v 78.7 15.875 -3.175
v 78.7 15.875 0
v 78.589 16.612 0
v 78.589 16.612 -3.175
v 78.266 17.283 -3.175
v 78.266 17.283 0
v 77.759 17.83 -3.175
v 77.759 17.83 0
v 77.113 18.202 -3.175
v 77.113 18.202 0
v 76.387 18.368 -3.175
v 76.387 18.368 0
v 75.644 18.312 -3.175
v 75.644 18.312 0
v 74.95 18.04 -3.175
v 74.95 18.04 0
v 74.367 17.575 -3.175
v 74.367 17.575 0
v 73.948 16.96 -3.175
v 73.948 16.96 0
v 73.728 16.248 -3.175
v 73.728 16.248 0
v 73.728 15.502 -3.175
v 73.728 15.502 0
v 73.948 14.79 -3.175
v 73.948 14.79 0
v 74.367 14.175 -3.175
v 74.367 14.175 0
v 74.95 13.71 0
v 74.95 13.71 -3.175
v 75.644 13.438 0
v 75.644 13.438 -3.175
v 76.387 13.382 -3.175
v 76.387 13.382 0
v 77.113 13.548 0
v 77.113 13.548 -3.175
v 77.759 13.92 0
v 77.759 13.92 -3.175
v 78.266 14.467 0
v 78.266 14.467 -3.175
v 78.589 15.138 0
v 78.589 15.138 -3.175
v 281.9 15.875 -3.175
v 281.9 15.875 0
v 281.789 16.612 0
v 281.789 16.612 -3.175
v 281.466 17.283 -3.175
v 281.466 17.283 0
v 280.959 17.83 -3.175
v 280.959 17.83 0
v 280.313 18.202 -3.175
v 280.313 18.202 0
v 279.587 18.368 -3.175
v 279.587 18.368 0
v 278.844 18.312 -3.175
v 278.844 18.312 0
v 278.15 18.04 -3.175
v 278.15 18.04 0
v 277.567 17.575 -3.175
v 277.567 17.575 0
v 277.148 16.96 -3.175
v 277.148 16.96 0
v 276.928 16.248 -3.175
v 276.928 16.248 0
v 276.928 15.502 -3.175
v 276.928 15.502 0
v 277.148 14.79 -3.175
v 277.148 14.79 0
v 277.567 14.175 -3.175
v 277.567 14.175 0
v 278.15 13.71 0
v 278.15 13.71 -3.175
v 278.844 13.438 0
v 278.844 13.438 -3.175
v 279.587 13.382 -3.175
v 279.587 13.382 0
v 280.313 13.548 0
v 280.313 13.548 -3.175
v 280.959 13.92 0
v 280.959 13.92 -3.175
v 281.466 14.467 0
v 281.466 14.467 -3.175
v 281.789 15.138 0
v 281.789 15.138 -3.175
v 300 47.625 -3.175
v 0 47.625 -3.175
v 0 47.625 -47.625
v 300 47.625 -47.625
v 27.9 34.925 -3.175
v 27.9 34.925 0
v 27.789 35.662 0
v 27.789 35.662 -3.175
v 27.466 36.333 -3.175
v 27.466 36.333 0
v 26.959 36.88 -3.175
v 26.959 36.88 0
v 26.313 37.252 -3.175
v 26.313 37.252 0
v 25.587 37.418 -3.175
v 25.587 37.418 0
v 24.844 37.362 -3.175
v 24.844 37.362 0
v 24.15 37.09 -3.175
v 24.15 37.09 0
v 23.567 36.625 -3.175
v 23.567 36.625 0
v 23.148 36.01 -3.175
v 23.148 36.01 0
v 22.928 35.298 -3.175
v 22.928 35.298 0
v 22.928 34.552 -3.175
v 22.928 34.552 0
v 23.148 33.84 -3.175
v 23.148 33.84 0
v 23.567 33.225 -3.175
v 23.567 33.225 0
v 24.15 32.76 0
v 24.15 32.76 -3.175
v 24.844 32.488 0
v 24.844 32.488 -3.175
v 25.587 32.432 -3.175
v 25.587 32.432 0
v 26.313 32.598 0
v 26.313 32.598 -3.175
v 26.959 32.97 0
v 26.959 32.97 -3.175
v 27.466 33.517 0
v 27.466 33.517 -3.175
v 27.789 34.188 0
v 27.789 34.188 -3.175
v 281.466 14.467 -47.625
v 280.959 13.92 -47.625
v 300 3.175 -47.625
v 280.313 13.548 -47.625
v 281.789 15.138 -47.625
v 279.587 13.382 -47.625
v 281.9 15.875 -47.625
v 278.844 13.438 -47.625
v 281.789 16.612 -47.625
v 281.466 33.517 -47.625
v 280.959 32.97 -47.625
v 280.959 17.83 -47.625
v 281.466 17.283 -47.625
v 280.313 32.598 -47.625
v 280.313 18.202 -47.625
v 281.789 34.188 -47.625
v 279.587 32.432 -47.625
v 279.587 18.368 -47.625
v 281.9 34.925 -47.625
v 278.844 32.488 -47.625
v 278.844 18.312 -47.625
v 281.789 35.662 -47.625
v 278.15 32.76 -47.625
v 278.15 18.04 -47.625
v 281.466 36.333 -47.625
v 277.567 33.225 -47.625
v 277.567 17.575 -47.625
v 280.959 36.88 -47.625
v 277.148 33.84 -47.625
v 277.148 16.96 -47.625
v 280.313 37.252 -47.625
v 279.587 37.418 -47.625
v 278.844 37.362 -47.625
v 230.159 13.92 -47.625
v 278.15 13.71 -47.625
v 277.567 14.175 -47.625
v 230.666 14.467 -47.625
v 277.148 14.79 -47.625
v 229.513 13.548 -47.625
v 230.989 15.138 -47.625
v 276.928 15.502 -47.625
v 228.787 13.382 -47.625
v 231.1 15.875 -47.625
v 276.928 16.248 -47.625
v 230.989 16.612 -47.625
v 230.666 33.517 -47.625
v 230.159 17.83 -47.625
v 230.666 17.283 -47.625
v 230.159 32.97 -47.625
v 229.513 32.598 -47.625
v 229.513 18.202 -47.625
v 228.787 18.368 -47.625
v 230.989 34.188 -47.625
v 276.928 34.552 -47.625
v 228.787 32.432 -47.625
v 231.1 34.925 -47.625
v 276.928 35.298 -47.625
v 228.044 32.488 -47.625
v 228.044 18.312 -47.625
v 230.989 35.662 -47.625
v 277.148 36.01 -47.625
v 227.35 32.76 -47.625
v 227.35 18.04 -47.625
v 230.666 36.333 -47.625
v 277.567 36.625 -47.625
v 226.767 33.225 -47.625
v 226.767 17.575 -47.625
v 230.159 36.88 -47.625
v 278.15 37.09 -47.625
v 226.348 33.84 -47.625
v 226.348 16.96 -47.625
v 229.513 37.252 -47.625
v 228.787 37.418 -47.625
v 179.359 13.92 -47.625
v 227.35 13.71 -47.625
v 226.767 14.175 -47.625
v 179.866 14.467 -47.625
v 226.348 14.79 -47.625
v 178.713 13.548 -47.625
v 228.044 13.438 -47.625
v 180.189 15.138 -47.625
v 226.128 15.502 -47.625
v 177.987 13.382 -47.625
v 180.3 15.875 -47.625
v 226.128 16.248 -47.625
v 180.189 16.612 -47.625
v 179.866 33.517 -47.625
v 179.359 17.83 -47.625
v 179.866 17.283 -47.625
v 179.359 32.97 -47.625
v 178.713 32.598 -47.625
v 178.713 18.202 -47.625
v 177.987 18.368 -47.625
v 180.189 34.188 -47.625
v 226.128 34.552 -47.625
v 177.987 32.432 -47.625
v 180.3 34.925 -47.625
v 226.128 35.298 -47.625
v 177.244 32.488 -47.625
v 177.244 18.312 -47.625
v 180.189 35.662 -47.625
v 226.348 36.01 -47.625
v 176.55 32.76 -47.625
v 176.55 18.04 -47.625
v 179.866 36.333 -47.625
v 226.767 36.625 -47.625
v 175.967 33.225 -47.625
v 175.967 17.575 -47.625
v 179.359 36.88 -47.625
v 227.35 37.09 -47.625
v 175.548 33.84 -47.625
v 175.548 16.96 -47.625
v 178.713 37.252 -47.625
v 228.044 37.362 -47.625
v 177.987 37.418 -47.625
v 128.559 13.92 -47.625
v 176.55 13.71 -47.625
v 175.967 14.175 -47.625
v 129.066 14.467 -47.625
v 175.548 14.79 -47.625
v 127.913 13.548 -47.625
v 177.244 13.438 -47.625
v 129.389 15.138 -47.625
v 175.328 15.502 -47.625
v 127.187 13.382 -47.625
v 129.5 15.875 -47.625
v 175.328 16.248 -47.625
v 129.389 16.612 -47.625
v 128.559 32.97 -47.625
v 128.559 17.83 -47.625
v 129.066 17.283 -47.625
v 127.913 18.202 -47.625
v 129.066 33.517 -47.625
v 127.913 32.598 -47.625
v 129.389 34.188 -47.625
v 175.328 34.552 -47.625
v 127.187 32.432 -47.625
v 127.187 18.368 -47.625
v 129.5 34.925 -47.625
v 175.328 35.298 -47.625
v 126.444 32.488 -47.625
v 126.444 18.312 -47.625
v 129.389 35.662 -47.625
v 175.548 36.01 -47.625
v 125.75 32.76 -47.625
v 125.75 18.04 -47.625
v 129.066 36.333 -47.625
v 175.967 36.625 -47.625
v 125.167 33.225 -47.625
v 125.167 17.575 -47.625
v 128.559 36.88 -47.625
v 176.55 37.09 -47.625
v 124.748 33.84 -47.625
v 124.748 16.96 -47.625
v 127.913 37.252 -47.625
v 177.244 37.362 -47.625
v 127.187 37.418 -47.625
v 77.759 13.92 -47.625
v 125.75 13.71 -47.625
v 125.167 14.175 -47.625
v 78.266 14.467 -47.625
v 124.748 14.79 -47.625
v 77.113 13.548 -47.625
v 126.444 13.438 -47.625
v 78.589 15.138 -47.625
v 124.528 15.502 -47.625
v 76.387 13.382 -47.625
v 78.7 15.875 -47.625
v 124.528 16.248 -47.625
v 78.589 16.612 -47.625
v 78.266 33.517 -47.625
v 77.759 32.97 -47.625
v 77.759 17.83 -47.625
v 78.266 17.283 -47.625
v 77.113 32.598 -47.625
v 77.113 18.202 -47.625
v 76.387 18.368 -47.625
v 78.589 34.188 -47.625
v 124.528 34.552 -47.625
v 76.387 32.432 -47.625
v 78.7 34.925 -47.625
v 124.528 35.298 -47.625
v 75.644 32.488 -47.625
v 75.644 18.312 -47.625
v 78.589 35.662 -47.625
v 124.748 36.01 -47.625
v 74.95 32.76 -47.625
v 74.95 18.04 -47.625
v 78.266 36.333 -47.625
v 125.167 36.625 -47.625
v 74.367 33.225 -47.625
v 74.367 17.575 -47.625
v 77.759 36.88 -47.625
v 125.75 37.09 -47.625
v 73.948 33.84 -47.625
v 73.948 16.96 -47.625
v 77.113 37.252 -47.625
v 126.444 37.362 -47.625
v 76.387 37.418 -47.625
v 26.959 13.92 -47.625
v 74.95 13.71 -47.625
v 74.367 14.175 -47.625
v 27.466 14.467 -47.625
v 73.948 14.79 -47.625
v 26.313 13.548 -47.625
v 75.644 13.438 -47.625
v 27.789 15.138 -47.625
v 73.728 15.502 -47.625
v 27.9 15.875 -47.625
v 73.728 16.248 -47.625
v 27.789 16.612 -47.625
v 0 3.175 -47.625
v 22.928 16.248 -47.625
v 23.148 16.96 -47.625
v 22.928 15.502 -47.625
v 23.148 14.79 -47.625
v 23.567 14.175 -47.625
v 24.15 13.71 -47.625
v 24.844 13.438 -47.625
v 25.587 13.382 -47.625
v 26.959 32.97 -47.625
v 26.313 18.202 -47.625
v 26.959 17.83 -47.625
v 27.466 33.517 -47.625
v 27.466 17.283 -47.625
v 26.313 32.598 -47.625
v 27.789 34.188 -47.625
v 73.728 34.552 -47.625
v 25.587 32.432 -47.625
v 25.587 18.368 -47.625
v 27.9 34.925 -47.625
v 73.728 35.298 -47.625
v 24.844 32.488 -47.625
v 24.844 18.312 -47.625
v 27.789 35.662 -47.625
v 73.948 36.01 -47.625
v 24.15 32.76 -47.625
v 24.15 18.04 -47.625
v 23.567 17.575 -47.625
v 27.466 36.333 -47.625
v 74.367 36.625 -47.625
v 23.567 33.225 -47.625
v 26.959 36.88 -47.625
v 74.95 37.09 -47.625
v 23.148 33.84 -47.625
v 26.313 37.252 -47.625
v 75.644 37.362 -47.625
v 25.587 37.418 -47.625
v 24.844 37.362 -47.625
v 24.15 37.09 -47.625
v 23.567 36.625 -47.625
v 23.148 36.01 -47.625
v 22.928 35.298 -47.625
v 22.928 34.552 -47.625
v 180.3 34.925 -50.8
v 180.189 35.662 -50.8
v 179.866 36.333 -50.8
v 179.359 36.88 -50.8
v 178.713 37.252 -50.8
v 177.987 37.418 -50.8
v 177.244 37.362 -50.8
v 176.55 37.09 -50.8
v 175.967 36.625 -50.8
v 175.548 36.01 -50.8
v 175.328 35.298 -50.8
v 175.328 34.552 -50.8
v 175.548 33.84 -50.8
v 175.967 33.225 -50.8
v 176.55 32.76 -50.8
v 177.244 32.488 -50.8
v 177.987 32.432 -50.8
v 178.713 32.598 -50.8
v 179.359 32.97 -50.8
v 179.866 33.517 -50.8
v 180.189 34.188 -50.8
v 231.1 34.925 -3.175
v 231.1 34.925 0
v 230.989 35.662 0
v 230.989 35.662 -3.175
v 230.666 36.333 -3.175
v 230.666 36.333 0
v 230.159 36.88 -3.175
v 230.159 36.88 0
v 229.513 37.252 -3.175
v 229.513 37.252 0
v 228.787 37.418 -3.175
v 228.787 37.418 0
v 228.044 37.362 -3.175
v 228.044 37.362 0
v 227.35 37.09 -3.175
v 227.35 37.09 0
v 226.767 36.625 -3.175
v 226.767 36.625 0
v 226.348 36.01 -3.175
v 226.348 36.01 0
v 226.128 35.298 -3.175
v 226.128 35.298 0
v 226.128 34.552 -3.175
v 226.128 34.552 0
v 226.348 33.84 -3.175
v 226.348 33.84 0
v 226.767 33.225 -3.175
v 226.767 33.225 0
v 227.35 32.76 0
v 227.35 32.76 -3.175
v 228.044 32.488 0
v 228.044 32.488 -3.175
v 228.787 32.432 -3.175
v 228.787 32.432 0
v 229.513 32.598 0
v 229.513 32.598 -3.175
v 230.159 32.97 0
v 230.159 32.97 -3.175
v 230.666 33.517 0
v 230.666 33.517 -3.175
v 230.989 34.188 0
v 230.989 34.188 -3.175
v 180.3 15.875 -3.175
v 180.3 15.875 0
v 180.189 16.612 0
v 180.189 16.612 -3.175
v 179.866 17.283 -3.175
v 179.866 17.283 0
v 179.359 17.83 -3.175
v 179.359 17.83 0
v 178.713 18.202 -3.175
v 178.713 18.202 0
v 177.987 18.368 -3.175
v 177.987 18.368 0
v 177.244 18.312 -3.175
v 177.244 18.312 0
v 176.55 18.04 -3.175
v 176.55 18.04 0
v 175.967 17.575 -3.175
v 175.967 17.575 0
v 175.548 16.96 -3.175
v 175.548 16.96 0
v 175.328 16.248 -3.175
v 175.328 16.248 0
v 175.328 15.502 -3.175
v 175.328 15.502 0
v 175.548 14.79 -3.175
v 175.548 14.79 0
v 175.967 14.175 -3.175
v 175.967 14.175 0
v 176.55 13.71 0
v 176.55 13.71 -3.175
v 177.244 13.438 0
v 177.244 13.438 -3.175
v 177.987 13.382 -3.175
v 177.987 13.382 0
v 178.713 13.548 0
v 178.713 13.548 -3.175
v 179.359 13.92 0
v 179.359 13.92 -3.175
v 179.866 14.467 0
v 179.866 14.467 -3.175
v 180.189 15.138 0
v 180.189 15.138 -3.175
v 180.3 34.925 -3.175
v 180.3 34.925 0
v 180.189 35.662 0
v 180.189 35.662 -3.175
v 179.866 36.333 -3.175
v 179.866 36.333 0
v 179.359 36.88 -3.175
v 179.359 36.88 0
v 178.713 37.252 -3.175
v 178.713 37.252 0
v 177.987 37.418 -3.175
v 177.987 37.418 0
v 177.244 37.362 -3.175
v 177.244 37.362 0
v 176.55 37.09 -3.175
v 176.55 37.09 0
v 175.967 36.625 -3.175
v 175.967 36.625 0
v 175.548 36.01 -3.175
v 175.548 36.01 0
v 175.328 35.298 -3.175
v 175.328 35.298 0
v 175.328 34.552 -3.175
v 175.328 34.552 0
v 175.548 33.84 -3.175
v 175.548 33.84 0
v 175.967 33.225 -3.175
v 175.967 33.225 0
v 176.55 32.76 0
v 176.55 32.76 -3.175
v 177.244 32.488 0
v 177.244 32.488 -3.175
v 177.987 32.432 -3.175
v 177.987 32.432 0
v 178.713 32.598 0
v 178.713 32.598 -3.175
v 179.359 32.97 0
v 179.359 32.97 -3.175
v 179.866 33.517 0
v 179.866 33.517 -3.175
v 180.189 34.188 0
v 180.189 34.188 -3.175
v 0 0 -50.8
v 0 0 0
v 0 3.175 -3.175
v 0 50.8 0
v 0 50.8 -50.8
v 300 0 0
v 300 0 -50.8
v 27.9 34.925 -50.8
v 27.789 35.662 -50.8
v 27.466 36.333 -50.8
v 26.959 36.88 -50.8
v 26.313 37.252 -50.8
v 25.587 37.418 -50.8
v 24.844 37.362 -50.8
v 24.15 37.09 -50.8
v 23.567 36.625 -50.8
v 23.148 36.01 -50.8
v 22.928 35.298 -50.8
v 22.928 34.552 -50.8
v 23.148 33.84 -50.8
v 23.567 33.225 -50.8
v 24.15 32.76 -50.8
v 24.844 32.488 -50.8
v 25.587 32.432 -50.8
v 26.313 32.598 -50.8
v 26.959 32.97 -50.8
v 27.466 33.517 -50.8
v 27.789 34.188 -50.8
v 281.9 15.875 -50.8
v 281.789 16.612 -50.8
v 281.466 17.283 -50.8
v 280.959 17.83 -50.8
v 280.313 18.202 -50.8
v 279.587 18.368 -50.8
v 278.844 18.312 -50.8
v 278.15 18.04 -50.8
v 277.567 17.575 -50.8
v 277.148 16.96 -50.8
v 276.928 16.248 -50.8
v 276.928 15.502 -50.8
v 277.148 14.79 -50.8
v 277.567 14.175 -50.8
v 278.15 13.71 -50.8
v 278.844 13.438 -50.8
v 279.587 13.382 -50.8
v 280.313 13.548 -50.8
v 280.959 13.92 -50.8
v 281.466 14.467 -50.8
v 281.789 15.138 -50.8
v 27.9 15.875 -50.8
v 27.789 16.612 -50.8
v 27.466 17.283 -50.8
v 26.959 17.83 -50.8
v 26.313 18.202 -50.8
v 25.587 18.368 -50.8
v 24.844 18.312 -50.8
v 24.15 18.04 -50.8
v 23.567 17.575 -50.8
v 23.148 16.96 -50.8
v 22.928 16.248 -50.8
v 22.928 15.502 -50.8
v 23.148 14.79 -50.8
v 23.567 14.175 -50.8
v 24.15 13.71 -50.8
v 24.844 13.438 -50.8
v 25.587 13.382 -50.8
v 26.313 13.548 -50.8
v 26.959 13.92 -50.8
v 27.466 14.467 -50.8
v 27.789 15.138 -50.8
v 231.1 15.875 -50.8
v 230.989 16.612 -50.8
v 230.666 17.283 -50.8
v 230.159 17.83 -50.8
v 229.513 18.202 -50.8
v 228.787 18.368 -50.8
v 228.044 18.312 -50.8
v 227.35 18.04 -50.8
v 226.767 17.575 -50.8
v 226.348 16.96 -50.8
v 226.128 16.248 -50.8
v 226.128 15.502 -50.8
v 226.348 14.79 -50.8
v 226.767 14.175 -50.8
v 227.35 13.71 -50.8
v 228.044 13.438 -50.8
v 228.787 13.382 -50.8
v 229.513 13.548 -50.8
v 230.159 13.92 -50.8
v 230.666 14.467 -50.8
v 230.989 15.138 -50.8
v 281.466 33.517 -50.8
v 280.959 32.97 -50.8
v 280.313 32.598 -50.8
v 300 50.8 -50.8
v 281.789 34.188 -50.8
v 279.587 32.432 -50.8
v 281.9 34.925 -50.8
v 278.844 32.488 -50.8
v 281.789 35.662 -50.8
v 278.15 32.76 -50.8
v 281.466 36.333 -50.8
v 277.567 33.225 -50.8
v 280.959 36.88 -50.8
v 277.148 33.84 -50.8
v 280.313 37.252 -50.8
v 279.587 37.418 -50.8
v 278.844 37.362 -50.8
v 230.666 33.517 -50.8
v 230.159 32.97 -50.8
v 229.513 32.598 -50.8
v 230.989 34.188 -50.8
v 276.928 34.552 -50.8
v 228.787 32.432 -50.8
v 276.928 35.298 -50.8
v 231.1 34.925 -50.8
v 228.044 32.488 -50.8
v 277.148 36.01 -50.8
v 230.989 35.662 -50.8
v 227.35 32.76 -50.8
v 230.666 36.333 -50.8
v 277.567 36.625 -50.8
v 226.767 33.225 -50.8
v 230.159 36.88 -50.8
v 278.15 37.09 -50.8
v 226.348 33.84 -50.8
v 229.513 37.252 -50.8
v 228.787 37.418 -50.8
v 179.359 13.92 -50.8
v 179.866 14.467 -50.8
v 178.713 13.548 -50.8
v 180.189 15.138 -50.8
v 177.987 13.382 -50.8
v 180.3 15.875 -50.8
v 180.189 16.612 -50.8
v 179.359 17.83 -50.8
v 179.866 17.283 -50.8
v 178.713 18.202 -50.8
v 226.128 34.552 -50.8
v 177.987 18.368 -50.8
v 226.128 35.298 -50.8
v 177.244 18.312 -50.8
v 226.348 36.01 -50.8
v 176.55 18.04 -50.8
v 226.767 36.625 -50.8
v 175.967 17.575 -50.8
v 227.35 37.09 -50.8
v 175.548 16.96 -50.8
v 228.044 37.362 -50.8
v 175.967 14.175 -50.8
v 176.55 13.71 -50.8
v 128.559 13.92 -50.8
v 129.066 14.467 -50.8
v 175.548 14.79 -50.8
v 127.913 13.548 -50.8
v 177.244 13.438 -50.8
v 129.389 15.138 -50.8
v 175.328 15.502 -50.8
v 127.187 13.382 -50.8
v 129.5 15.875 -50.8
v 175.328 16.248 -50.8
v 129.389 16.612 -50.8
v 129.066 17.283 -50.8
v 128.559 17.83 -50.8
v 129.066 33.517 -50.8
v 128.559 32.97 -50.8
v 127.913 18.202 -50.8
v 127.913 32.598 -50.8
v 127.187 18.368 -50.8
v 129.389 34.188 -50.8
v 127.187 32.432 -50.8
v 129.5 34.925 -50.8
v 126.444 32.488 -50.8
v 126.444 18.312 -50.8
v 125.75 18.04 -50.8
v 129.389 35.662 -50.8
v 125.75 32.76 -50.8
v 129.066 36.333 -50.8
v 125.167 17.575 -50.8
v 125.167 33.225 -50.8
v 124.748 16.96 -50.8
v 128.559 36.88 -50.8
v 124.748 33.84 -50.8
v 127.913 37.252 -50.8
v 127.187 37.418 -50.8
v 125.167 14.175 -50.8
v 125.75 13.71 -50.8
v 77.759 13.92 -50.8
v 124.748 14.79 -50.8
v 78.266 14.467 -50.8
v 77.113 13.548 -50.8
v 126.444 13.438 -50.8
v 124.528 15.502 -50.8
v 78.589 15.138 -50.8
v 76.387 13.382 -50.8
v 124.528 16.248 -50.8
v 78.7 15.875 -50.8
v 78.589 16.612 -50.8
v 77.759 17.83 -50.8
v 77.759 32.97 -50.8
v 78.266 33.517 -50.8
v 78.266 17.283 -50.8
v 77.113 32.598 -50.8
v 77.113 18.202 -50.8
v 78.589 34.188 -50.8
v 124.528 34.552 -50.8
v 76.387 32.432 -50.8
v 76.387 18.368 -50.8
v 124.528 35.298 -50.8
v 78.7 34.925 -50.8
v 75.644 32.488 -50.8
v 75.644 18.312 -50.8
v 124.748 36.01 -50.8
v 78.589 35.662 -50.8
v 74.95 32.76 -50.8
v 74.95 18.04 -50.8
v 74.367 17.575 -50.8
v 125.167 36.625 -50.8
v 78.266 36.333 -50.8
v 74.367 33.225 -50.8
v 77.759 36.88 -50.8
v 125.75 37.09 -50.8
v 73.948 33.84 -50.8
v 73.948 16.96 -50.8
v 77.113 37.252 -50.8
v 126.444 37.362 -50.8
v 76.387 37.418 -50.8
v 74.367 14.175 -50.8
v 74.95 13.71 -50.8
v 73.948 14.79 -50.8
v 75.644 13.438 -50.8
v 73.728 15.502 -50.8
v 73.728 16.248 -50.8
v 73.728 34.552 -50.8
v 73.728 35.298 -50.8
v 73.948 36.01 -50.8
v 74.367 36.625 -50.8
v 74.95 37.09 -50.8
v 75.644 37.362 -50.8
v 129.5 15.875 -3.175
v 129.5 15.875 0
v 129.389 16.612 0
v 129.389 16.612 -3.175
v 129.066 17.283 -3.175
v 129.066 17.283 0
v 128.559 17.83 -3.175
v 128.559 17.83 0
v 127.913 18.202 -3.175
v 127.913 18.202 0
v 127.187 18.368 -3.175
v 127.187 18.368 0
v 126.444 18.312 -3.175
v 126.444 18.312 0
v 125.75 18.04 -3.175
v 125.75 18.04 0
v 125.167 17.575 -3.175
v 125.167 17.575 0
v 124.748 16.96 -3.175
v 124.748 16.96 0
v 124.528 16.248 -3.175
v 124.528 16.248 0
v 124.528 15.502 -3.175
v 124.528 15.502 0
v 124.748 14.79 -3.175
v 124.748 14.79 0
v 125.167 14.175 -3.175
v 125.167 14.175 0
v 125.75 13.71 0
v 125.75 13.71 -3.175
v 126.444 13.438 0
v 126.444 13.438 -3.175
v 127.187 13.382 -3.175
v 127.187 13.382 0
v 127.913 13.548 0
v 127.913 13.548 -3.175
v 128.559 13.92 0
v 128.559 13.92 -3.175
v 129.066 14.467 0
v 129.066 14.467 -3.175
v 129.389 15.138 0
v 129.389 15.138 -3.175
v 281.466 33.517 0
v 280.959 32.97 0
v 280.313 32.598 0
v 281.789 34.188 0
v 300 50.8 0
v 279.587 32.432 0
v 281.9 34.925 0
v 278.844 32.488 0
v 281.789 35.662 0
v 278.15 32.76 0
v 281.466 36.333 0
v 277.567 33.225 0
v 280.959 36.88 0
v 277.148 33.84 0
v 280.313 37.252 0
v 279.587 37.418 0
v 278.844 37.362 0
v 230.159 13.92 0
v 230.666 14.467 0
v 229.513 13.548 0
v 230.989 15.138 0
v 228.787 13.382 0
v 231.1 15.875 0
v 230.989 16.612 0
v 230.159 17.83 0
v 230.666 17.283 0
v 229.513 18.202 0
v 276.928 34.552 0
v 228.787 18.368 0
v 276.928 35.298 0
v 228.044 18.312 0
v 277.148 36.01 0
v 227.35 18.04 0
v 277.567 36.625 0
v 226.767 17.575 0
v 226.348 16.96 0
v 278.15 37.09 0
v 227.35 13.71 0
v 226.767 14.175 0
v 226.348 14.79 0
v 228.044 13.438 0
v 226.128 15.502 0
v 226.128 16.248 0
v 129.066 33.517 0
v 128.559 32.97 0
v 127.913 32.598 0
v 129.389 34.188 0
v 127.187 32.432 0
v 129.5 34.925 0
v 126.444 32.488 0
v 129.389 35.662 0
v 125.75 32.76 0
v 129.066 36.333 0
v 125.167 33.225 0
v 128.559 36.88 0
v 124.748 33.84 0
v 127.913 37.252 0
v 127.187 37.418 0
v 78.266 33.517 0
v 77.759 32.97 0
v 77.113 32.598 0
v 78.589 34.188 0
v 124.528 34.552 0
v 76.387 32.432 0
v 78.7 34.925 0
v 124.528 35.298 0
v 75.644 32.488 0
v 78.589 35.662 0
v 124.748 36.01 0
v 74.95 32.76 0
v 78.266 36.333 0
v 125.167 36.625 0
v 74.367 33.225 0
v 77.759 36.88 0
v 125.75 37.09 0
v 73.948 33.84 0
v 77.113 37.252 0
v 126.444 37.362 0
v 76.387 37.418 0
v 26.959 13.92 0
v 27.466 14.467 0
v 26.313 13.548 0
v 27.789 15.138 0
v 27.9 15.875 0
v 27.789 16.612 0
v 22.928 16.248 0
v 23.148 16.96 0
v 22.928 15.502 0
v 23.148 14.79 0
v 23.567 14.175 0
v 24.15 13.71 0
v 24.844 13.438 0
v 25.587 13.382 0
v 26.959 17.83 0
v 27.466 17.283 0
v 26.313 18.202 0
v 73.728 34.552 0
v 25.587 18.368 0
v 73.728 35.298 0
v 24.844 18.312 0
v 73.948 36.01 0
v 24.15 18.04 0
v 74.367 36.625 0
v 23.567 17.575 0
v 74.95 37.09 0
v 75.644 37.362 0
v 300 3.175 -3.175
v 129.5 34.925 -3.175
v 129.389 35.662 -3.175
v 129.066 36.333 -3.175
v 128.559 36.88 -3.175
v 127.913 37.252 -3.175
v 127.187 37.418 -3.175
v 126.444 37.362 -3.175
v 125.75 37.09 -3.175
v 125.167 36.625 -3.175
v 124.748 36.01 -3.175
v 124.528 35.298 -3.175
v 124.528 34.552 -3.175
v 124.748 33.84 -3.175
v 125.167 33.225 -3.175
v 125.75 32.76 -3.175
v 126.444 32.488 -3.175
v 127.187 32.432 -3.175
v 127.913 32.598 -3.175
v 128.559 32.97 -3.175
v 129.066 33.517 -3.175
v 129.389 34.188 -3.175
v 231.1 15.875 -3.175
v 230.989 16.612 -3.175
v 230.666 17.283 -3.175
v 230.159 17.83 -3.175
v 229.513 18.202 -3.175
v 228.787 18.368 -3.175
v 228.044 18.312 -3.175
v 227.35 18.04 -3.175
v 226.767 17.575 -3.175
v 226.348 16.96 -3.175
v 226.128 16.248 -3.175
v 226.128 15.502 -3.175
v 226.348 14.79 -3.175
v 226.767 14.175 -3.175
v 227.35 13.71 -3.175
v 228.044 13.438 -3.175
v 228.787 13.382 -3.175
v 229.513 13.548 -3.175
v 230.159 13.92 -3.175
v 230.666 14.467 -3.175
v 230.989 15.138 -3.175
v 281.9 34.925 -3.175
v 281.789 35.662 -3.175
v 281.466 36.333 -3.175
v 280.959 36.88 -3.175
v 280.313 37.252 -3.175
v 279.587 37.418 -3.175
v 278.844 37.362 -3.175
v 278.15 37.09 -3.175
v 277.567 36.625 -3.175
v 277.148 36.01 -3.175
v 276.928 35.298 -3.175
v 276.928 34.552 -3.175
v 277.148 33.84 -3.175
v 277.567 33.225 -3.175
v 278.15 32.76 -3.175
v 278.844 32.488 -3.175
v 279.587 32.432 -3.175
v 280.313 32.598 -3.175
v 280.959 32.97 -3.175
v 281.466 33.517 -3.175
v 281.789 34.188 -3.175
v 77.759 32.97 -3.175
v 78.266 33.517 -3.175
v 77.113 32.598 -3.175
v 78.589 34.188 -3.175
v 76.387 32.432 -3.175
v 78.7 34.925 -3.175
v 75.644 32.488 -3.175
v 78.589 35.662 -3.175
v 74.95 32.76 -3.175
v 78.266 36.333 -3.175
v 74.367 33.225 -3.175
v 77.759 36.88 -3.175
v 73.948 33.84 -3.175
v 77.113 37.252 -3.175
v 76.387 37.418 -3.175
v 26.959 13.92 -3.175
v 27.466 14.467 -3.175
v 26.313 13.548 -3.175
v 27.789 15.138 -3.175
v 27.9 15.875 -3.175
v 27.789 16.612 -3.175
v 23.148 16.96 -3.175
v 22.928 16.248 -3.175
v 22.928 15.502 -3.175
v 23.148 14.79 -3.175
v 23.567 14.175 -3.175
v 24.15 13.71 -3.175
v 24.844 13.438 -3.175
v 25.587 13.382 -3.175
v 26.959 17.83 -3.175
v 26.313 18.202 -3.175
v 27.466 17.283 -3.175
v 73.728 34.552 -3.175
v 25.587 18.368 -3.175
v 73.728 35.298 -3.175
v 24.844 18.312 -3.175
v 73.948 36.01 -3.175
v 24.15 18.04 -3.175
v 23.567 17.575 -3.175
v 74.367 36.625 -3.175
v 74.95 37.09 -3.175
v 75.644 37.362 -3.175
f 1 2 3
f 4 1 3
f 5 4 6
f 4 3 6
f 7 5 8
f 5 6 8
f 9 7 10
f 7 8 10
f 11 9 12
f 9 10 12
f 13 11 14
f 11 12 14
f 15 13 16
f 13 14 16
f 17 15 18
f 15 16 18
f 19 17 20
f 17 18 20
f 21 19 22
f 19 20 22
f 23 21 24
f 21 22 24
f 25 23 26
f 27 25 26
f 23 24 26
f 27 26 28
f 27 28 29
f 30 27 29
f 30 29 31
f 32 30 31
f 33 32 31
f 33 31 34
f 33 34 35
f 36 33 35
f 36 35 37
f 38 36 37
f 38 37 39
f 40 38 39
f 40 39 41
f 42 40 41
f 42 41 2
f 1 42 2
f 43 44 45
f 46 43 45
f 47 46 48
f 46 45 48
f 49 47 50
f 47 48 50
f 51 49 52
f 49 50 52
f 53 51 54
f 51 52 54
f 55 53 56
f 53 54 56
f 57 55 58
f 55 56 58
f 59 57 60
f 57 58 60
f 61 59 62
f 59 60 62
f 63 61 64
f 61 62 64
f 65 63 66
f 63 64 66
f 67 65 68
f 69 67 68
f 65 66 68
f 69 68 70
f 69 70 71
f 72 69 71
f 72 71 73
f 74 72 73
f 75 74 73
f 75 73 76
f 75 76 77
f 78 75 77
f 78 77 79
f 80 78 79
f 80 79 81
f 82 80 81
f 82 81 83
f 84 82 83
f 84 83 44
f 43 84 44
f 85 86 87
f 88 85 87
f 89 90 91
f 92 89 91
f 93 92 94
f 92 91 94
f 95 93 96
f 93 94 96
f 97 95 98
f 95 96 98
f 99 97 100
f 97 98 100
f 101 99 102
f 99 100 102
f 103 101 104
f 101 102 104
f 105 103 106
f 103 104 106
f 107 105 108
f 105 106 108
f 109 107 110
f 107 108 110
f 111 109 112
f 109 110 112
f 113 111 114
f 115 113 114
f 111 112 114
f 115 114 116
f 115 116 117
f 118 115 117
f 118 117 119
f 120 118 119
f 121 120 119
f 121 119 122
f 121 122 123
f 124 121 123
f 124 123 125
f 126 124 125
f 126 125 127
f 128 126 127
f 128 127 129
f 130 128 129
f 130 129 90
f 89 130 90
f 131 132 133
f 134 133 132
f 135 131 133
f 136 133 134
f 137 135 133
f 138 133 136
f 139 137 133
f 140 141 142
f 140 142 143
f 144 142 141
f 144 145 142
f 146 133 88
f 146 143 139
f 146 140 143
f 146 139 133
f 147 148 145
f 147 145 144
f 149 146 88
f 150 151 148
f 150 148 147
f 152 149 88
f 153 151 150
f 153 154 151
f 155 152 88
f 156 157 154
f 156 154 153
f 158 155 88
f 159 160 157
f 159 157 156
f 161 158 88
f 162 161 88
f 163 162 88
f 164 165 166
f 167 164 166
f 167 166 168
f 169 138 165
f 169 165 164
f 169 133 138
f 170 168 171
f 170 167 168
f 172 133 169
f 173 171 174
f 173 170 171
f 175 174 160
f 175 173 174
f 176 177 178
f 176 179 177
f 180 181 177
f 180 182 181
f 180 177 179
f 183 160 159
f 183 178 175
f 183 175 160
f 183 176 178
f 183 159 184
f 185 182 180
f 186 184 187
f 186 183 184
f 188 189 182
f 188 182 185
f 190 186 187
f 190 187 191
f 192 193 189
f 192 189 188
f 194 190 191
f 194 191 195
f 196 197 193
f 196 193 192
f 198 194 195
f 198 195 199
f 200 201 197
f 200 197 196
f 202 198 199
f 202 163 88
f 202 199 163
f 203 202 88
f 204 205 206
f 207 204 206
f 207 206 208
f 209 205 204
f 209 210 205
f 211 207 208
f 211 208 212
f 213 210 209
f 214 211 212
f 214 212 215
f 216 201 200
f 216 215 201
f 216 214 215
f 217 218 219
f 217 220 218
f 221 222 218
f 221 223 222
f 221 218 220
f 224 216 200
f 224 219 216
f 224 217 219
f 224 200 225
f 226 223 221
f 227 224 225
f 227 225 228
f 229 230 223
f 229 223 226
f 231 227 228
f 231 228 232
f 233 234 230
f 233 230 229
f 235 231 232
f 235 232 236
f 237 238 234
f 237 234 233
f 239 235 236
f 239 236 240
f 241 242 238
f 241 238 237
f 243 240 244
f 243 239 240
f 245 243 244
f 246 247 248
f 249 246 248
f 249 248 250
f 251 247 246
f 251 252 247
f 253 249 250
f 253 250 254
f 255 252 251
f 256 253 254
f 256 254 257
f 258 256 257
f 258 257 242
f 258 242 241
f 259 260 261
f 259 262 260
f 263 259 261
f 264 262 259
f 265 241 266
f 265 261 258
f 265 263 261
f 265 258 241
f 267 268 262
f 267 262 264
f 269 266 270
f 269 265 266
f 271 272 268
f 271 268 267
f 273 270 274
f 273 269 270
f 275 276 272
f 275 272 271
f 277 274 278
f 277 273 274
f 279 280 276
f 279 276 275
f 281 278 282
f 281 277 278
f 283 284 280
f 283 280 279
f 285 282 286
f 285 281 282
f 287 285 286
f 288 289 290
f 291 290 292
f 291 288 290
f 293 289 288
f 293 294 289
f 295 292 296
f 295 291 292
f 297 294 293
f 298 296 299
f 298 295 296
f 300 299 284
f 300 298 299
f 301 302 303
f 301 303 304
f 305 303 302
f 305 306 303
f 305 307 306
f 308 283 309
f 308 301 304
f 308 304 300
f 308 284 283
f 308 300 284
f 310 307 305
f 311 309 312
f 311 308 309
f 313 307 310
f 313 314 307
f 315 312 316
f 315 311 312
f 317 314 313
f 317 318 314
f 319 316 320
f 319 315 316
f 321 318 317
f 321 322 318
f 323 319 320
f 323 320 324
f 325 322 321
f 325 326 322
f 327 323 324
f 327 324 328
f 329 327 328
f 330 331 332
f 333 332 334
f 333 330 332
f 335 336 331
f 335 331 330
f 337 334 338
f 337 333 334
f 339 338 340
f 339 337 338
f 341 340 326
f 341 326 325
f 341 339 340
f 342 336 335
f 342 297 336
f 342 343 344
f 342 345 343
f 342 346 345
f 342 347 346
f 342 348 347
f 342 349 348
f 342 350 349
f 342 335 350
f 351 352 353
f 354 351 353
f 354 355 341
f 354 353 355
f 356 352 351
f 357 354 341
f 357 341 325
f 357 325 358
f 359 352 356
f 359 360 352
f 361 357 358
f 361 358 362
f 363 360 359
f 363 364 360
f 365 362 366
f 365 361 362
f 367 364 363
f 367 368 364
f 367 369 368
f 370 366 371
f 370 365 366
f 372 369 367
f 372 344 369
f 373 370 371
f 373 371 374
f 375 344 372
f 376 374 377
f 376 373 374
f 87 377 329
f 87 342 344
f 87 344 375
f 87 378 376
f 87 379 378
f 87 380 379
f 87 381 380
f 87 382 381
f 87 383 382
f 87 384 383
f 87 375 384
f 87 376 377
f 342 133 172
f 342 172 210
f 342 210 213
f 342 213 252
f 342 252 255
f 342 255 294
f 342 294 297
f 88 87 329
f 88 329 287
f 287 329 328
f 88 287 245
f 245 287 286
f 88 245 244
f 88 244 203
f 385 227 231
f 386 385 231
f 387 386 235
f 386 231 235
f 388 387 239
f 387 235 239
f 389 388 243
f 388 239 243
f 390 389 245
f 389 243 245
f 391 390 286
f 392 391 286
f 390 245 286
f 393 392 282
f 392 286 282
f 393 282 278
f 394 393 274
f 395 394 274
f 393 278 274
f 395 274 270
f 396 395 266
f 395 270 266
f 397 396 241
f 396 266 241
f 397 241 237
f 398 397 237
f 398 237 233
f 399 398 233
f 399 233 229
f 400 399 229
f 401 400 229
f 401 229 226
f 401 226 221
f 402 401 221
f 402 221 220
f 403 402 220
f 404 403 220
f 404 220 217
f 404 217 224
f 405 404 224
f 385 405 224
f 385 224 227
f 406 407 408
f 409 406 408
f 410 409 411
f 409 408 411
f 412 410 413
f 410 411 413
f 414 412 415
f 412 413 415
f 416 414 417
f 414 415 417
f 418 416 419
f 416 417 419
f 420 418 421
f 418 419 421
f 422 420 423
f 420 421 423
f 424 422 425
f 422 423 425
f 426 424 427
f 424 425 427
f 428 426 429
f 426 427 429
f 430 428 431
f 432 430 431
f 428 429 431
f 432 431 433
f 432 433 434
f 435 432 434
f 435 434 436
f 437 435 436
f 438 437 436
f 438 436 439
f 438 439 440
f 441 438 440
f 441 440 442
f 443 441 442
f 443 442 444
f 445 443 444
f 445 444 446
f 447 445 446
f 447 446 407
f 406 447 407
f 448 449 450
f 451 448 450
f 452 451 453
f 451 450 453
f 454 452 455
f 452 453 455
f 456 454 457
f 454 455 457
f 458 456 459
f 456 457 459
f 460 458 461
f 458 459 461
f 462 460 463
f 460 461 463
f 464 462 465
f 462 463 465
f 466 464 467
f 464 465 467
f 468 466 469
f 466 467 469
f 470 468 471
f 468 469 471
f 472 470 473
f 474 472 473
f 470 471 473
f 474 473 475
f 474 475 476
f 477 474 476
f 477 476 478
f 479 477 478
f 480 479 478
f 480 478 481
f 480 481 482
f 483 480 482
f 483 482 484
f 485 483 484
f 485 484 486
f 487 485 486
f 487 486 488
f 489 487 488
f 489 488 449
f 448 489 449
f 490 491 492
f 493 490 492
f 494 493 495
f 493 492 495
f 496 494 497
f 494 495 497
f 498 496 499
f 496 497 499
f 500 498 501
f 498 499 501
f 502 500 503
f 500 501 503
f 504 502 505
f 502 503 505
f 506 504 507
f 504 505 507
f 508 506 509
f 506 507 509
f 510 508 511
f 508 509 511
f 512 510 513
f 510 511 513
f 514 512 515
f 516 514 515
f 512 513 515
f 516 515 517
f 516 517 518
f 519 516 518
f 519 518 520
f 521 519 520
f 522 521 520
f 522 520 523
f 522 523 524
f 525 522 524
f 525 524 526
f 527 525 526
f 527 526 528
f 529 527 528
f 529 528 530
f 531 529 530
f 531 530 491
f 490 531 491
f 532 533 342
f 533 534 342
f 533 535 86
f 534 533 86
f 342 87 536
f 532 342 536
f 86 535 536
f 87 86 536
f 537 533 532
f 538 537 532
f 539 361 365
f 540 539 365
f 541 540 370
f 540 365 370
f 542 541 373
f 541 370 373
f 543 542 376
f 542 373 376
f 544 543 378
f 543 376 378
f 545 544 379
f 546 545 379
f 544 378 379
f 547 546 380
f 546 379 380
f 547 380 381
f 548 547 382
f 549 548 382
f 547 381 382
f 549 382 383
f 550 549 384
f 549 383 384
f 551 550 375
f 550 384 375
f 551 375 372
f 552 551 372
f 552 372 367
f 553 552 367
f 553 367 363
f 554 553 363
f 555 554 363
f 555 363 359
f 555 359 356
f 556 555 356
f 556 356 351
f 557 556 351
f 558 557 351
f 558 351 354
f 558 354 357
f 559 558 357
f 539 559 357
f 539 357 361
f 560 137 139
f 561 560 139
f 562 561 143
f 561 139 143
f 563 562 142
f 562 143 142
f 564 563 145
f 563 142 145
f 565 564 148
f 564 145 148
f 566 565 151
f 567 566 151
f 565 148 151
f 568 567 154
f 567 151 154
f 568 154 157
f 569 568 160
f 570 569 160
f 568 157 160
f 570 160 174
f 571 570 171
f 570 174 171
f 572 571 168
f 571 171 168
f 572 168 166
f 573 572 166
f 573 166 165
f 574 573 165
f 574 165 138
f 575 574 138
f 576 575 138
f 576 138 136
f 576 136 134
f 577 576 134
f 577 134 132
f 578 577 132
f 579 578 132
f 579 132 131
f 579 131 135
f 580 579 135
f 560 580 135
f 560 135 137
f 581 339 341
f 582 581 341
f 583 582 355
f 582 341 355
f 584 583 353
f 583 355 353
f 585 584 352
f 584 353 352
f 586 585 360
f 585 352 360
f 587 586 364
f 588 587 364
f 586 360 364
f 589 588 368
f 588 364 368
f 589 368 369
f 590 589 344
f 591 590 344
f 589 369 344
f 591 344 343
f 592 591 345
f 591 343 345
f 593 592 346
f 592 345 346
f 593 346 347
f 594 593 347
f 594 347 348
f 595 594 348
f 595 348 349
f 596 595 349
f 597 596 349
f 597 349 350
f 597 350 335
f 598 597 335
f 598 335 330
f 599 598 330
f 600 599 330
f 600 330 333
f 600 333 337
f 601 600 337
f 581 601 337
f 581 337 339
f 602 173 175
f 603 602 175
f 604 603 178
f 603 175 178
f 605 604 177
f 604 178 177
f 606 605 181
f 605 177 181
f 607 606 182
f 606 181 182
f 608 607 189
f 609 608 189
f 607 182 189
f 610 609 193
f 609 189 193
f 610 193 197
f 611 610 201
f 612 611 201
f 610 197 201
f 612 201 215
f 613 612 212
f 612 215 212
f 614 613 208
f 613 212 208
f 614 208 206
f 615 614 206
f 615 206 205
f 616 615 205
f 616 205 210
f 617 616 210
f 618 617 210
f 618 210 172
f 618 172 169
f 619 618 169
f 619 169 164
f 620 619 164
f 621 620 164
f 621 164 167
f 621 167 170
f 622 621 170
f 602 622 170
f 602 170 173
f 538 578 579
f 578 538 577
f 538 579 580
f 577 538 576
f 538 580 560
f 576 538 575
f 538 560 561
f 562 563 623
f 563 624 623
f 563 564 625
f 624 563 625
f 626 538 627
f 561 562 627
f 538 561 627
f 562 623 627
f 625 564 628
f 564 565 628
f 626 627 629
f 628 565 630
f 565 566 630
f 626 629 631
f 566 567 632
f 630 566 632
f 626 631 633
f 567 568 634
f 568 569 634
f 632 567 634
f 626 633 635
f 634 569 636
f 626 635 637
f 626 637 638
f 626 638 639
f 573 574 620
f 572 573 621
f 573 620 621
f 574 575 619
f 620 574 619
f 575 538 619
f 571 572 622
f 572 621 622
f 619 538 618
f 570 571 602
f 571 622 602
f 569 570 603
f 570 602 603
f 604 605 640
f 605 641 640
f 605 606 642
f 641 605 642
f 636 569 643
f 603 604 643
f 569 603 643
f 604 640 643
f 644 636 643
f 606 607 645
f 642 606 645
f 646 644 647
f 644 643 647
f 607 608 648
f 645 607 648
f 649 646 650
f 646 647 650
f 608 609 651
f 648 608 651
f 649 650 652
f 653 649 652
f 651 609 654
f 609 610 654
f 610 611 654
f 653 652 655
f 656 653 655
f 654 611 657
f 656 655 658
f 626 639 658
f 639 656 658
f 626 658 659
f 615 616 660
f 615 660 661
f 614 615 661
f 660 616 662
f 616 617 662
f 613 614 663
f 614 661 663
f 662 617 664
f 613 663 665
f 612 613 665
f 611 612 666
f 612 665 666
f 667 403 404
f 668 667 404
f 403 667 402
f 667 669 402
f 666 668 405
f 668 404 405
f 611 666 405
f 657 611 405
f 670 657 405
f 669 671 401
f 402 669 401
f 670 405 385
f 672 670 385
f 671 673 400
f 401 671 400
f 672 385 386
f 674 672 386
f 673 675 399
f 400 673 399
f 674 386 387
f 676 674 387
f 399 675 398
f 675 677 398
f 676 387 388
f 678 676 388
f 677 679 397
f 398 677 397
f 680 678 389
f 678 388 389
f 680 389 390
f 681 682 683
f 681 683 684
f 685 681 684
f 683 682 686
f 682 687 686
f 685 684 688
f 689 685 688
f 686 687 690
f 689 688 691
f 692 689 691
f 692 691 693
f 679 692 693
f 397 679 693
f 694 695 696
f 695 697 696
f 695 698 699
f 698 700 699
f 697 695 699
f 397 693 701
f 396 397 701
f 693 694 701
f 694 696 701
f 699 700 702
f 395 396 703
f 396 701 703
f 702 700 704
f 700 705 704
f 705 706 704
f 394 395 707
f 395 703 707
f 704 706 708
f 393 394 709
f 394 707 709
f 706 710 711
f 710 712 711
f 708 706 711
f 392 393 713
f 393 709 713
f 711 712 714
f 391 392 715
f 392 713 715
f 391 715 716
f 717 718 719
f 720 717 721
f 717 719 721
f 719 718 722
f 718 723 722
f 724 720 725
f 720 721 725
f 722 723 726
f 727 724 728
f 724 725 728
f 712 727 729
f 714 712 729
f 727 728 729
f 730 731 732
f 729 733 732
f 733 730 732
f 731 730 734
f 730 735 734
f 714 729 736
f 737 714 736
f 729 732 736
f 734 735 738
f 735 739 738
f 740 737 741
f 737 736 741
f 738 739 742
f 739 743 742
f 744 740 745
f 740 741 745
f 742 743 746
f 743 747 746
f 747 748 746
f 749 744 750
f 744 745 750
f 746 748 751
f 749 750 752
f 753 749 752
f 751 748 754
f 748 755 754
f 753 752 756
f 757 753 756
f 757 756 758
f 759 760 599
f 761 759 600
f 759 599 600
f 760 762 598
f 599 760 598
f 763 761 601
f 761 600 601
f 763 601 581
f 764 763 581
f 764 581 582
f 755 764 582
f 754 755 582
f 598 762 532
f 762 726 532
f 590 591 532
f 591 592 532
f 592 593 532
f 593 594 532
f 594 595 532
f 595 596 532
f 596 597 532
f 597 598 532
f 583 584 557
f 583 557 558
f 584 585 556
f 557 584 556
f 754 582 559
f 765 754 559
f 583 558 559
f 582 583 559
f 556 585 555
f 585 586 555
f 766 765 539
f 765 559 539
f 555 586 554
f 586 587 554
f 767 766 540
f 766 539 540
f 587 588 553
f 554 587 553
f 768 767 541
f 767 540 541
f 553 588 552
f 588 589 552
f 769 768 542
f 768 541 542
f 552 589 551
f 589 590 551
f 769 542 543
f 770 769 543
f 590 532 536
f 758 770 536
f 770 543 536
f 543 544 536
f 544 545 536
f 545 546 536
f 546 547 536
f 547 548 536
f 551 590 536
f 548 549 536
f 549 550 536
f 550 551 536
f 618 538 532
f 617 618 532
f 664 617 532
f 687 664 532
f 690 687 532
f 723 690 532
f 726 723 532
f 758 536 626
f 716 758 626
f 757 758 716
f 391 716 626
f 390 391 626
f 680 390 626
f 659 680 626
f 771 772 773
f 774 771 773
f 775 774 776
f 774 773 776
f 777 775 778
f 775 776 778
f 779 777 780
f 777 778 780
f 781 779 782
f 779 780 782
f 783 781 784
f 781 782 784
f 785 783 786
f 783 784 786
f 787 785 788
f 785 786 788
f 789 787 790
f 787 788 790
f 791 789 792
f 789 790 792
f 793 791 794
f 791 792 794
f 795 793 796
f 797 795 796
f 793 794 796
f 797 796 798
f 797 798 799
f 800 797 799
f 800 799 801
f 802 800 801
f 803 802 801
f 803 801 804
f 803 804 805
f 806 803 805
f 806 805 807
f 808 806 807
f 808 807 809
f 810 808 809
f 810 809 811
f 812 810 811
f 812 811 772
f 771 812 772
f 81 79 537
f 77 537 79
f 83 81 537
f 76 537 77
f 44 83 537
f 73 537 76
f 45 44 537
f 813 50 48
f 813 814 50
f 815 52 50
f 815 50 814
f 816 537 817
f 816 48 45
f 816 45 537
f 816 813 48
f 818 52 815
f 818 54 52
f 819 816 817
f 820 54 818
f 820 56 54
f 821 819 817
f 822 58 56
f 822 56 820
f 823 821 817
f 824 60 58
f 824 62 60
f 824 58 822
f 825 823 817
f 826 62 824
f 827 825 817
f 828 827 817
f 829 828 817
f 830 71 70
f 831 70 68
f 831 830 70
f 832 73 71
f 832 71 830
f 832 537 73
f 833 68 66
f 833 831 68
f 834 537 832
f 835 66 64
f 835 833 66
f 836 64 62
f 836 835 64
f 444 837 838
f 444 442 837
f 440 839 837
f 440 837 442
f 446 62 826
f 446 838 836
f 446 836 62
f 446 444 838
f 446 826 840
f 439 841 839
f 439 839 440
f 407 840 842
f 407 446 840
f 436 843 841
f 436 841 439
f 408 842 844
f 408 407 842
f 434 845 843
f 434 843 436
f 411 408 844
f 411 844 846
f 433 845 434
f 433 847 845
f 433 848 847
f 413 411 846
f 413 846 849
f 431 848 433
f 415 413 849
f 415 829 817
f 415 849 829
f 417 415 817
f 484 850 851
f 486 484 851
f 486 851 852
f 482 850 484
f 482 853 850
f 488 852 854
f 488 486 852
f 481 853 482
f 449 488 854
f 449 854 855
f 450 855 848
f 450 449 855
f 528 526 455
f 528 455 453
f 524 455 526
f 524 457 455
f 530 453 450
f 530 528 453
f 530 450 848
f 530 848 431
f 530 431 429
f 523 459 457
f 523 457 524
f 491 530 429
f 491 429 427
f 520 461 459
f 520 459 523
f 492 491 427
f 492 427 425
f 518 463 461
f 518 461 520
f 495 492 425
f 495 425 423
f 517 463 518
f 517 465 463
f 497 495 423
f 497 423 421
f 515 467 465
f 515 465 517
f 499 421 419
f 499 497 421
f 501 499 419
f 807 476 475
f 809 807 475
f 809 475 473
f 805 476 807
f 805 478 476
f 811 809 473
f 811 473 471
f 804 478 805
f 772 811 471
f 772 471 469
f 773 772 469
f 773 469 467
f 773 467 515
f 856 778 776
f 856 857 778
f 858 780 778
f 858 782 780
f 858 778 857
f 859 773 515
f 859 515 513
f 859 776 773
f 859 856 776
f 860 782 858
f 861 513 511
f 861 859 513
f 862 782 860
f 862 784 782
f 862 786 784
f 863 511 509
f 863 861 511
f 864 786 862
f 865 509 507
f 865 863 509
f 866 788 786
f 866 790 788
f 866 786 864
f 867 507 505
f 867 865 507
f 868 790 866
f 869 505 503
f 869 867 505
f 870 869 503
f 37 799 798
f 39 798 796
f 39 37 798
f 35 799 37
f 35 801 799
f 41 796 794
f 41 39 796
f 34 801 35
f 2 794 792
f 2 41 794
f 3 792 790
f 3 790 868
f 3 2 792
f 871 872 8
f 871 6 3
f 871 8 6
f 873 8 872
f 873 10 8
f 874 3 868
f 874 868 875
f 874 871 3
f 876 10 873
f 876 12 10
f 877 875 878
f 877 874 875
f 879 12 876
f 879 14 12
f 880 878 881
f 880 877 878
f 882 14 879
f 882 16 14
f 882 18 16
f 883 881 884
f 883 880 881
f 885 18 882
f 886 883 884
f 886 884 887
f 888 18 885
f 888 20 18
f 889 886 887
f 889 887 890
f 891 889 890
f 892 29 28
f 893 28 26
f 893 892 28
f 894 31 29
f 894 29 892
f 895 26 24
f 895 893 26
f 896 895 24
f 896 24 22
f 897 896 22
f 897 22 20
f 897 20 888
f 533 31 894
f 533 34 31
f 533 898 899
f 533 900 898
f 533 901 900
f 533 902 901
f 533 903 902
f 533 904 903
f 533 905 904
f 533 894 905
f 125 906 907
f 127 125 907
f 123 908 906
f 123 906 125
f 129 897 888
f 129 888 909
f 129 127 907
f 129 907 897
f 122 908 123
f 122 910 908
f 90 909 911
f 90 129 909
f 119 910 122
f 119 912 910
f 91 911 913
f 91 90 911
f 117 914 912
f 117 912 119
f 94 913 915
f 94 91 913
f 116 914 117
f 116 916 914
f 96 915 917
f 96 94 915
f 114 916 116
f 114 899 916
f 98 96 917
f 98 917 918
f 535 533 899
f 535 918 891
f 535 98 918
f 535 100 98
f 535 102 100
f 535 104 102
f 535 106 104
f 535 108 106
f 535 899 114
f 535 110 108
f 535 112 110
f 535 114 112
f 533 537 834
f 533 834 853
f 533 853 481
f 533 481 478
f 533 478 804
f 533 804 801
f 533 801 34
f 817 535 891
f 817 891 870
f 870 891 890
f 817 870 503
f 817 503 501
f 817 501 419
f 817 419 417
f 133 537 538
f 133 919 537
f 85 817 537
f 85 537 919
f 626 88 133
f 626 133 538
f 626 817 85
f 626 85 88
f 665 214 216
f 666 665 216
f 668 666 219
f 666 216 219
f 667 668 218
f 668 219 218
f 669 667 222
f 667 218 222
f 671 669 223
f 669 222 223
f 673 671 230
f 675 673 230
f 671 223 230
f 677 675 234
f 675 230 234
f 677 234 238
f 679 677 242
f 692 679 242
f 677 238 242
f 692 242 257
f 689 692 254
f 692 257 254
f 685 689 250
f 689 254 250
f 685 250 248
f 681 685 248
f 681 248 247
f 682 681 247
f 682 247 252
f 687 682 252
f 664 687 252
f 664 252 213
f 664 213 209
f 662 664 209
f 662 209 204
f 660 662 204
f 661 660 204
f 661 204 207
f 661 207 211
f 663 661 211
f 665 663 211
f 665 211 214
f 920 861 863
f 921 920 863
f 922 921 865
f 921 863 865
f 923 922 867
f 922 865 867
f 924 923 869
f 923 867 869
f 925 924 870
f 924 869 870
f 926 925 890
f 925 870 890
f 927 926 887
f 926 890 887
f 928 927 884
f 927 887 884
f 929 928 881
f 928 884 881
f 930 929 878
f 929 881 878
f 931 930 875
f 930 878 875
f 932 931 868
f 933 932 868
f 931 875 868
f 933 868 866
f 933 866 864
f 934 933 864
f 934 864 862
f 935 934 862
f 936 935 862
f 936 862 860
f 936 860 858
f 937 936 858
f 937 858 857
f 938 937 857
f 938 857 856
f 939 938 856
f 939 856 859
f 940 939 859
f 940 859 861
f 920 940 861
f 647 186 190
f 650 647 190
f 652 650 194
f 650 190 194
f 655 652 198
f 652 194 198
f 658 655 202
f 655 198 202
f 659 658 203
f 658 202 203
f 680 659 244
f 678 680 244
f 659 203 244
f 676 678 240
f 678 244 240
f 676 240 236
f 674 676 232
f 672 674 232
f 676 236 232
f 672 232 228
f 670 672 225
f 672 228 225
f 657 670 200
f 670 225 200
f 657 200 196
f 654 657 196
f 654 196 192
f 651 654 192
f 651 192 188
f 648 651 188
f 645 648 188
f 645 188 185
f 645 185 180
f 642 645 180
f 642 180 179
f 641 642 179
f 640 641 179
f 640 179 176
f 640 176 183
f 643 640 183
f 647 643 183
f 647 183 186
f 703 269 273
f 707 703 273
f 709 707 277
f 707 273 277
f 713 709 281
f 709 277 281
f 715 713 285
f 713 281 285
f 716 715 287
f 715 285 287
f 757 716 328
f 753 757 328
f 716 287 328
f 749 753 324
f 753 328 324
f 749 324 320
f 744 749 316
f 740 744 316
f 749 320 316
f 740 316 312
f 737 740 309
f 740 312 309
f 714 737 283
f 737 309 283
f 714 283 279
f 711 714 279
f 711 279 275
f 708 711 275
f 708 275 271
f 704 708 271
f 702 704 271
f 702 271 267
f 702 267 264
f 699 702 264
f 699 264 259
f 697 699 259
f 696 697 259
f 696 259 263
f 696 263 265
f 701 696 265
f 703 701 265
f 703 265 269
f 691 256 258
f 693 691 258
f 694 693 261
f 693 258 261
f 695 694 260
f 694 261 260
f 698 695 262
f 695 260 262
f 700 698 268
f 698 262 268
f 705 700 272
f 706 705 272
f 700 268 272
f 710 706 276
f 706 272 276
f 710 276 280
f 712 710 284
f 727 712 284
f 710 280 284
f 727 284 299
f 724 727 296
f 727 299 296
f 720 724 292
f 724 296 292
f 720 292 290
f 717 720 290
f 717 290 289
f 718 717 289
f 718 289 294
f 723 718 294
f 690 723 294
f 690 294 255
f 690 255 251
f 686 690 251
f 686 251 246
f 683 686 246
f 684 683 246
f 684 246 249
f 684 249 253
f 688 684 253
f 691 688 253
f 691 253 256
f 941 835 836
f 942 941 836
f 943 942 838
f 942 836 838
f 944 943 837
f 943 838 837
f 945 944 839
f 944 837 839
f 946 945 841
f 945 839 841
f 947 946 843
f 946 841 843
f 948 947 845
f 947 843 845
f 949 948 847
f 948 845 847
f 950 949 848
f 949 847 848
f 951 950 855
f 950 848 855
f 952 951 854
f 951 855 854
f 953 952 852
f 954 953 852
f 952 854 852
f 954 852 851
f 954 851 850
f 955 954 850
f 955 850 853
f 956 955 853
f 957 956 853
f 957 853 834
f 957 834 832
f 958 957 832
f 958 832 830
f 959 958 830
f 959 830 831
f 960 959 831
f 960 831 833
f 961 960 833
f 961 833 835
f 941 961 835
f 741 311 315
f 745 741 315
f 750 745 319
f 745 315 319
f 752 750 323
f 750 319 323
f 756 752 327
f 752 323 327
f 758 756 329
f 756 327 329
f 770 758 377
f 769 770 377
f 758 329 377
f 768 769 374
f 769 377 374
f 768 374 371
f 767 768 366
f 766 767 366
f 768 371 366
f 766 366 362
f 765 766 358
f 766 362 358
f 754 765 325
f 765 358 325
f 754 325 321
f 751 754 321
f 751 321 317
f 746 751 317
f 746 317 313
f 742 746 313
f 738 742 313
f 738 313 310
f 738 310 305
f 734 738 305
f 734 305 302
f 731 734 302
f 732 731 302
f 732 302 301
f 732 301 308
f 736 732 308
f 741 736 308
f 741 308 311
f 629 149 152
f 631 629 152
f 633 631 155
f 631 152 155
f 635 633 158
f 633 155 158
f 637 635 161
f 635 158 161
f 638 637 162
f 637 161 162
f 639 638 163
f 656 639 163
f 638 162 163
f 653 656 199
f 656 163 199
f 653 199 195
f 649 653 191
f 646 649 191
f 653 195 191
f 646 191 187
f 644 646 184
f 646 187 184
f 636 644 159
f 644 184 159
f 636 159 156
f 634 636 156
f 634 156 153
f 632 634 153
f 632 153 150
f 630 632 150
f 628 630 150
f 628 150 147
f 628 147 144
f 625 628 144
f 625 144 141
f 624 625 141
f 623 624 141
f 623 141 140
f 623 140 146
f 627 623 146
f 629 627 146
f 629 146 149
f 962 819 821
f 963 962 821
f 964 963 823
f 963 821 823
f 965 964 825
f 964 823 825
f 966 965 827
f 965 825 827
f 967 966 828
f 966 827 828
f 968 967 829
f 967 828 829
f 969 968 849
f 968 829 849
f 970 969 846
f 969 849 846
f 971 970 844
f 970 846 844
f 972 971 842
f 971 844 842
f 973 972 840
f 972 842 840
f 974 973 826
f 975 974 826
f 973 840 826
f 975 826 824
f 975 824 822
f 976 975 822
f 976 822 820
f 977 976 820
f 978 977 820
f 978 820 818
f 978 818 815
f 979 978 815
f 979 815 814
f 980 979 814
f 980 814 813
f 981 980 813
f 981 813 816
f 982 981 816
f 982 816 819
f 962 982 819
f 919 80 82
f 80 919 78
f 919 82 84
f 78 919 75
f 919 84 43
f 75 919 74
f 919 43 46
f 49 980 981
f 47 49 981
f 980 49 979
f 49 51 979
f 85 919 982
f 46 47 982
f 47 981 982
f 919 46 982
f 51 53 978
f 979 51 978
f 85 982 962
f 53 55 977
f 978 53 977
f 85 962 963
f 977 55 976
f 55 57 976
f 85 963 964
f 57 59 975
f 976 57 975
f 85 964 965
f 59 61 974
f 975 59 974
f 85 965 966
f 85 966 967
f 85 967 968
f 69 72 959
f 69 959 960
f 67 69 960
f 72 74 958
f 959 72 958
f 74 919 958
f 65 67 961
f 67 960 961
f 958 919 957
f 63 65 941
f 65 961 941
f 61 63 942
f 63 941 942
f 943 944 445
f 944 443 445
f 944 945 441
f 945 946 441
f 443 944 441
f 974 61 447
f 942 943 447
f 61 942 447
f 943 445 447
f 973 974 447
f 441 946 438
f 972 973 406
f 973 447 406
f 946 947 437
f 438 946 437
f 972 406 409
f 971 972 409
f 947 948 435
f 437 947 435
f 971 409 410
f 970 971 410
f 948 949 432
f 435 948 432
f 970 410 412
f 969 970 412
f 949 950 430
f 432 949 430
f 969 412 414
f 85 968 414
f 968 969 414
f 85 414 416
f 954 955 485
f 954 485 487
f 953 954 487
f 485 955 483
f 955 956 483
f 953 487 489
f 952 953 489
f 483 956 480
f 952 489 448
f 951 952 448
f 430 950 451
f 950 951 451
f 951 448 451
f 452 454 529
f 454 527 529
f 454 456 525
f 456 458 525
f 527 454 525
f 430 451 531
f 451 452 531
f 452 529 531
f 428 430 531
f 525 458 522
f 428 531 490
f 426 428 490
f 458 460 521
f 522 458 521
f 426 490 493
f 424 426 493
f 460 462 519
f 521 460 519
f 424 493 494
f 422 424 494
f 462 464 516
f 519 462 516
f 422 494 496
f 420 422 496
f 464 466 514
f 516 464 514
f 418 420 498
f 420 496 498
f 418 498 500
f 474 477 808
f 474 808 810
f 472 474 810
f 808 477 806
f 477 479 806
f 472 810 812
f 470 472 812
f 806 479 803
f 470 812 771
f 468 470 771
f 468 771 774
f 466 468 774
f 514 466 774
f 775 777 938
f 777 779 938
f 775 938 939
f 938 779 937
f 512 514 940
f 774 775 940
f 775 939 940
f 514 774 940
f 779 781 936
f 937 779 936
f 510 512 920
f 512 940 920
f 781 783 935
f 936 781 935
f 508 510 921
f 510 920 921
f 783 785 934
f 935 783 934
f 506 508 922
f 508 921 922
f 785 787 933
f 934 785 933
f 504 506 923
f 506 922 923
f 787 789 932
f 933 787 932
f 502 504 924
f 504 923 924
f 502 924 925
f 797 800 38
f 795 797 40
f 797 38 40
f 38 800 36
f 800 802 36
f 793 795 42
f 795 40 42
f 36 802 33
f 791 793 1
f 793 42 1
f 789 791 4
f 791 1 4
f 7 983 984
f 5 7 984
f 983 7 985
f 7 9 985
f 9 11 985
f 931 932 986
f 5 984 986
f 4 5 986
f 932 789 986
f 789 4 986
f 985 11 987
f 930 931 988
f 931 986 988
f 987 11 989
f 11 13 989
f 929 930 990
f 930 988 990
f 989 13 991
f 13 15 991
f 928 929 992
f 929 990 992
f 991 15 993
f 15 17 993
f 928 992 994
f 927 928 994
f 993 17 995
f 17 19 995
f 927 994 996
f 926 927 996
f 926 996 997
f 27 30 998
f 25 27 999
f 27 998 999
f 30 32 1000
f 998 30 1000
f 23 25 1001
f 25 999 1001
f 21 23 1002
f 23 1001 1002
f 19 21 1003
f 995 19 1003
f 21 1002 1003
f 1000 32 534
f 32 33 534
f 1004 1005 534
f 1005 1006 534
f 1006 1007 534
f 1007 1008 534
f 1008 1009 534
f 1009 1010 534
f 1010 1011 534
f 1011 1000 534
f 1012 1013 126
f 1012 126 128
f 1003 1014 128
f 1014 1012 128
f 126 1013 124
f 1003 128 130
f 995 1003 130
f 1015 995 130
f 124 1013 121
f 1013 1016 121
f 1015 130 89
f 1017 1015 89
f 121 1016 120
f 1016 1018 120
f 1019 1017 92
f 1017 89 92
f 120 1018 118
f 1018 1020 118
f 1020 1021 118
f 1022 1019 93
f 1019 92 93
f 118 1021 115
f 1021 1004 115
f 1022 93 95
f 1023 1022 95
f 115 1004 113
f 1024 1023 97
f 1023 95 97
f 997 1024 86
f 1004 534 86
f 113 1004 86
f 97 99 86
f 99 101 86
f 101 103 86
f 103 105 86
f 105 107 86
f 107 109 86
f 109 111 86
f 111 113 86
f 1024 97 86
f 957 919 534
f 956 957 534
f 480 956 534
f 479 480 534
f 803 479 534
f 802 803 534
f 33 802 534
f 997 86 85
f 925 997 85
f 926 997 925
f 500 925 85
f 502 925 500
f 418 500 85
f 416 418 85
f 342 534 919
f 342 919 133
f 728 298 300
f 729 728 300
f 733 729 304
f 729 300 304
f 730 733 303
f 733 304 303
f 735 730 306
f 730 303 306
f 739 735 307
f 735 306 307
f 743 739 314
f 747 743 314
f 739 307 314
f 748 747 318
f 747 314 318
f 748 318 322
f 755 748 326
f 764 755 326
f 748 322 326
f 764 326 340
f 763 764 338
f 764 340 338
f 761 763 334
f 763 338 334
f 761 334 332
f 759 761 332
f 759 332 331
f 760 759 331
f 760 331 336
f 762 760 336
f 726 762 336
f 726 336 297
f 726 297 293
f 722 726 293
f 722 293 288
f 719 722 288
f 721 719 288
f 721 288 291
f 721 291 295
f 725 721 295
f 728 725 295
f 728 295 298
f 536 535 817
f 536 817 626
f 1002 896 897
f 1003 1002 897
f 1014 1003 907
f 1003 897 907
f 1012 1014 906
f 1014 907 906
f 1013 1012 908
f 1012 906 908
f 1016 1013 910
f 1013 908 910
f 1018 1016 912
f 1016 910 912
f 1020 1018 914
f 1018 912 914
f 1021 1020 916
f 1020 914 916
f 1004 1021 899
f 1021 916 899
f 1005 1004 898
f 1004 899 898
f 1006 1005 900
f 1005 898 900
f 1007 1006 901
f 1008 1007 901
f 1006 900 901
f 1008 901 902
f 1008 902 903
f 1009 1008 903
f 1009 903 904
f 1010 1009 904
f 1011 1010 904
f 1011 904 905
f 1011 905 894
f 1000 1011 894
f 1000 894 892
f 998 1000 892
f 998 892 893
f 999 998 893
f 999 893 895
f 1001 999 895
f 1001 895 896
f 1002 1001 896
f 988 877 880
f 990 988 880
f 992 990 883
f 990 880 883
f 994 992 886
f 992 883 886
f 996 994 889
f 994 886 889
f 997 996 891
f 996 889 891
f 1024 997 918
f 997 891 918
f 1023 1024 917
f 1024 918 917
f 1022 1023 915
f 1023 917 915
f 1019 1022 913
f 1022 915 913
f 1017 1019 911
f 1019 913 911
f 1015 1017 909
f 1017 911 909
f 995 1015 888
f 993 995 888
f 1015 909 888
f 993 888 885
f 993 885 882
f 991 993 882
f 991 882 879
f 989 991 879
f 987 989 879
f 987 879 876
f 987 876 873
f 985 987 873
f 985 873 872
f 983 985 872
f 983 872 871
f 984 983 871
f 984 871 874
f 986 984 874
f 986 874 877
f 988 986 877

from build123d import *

# Parameters (mm, degrees)
SKETCH1_W           = 50.8
SKETCH1_H           = 50.8
SKETCH1_W_2         = 44.45
SKETCH1_H_2         = 44.45
BOSS_EXTRUDE1_DEPTH = 300
SKETCH2_R           = 2.5
CUT_EXTRUDE1_DEPTH  = 300


with BuildPart() as part:
    # Sketch1 → Boss-Extrude1 (new body)
    with BuildSketch(Plane(origin=(0, 0, 0), x_dir=(0, 0, -1), z_dir=(1, 0, 0))):
        with Locations((25.4, 25.4)):
            Rectangle(SKETCH1_W, SKETCH1_H)
        with Locations((25.4, 25.4)):
            Rectangle(SKETCH1_W_2, SKETCH1_H_2, mode=Mode.SUBTRACT)
    extrude(amount=BOSS_EXTRUDE1_DEPTH)

    # Sketch2 → Cut-Extrude1 (cut)
    with BuildSketch(Plane.XY):
        with Locations((25.4, 15.875)):
            Circle(SKETCH2_R)
        with Locations((76.2, 15.875)):
            Circle(SKETCH2_R)
        with Locations((127, 15.875)):
            Circle(SKETCH2_R)
        with Locations((177.8, 15.875)):
            Circle(SKETCH2_R)
        with Locations((228.6, 15.875)):
            Circle(SKETCH2_R)
        with Locations((279.4, 15.875)):
            Circle(SKETCH2_R)
        with Locations((76.2, 34.925)):
            Circle(SKETCH2_R)
        with Locations((127, 34.925)):
            Circle(SKETCH2_R)
        with Locations((177.8, 34.925)):
            Circle(SKETCH2_R)
        with Locations((228.6, 34.925)):
            Circle(SKETCH2_R)
        with Locations((279.4, 34.925)):
            Circle(SKETCH2_R)
        with Locations((25.4, 34.925)):
            Circle(SKETCH2_R)
    extrude(amount=-CUT_EXTRUDE1_DEPTH, mode=Mode.SUBTRACT)


solid = part.part
